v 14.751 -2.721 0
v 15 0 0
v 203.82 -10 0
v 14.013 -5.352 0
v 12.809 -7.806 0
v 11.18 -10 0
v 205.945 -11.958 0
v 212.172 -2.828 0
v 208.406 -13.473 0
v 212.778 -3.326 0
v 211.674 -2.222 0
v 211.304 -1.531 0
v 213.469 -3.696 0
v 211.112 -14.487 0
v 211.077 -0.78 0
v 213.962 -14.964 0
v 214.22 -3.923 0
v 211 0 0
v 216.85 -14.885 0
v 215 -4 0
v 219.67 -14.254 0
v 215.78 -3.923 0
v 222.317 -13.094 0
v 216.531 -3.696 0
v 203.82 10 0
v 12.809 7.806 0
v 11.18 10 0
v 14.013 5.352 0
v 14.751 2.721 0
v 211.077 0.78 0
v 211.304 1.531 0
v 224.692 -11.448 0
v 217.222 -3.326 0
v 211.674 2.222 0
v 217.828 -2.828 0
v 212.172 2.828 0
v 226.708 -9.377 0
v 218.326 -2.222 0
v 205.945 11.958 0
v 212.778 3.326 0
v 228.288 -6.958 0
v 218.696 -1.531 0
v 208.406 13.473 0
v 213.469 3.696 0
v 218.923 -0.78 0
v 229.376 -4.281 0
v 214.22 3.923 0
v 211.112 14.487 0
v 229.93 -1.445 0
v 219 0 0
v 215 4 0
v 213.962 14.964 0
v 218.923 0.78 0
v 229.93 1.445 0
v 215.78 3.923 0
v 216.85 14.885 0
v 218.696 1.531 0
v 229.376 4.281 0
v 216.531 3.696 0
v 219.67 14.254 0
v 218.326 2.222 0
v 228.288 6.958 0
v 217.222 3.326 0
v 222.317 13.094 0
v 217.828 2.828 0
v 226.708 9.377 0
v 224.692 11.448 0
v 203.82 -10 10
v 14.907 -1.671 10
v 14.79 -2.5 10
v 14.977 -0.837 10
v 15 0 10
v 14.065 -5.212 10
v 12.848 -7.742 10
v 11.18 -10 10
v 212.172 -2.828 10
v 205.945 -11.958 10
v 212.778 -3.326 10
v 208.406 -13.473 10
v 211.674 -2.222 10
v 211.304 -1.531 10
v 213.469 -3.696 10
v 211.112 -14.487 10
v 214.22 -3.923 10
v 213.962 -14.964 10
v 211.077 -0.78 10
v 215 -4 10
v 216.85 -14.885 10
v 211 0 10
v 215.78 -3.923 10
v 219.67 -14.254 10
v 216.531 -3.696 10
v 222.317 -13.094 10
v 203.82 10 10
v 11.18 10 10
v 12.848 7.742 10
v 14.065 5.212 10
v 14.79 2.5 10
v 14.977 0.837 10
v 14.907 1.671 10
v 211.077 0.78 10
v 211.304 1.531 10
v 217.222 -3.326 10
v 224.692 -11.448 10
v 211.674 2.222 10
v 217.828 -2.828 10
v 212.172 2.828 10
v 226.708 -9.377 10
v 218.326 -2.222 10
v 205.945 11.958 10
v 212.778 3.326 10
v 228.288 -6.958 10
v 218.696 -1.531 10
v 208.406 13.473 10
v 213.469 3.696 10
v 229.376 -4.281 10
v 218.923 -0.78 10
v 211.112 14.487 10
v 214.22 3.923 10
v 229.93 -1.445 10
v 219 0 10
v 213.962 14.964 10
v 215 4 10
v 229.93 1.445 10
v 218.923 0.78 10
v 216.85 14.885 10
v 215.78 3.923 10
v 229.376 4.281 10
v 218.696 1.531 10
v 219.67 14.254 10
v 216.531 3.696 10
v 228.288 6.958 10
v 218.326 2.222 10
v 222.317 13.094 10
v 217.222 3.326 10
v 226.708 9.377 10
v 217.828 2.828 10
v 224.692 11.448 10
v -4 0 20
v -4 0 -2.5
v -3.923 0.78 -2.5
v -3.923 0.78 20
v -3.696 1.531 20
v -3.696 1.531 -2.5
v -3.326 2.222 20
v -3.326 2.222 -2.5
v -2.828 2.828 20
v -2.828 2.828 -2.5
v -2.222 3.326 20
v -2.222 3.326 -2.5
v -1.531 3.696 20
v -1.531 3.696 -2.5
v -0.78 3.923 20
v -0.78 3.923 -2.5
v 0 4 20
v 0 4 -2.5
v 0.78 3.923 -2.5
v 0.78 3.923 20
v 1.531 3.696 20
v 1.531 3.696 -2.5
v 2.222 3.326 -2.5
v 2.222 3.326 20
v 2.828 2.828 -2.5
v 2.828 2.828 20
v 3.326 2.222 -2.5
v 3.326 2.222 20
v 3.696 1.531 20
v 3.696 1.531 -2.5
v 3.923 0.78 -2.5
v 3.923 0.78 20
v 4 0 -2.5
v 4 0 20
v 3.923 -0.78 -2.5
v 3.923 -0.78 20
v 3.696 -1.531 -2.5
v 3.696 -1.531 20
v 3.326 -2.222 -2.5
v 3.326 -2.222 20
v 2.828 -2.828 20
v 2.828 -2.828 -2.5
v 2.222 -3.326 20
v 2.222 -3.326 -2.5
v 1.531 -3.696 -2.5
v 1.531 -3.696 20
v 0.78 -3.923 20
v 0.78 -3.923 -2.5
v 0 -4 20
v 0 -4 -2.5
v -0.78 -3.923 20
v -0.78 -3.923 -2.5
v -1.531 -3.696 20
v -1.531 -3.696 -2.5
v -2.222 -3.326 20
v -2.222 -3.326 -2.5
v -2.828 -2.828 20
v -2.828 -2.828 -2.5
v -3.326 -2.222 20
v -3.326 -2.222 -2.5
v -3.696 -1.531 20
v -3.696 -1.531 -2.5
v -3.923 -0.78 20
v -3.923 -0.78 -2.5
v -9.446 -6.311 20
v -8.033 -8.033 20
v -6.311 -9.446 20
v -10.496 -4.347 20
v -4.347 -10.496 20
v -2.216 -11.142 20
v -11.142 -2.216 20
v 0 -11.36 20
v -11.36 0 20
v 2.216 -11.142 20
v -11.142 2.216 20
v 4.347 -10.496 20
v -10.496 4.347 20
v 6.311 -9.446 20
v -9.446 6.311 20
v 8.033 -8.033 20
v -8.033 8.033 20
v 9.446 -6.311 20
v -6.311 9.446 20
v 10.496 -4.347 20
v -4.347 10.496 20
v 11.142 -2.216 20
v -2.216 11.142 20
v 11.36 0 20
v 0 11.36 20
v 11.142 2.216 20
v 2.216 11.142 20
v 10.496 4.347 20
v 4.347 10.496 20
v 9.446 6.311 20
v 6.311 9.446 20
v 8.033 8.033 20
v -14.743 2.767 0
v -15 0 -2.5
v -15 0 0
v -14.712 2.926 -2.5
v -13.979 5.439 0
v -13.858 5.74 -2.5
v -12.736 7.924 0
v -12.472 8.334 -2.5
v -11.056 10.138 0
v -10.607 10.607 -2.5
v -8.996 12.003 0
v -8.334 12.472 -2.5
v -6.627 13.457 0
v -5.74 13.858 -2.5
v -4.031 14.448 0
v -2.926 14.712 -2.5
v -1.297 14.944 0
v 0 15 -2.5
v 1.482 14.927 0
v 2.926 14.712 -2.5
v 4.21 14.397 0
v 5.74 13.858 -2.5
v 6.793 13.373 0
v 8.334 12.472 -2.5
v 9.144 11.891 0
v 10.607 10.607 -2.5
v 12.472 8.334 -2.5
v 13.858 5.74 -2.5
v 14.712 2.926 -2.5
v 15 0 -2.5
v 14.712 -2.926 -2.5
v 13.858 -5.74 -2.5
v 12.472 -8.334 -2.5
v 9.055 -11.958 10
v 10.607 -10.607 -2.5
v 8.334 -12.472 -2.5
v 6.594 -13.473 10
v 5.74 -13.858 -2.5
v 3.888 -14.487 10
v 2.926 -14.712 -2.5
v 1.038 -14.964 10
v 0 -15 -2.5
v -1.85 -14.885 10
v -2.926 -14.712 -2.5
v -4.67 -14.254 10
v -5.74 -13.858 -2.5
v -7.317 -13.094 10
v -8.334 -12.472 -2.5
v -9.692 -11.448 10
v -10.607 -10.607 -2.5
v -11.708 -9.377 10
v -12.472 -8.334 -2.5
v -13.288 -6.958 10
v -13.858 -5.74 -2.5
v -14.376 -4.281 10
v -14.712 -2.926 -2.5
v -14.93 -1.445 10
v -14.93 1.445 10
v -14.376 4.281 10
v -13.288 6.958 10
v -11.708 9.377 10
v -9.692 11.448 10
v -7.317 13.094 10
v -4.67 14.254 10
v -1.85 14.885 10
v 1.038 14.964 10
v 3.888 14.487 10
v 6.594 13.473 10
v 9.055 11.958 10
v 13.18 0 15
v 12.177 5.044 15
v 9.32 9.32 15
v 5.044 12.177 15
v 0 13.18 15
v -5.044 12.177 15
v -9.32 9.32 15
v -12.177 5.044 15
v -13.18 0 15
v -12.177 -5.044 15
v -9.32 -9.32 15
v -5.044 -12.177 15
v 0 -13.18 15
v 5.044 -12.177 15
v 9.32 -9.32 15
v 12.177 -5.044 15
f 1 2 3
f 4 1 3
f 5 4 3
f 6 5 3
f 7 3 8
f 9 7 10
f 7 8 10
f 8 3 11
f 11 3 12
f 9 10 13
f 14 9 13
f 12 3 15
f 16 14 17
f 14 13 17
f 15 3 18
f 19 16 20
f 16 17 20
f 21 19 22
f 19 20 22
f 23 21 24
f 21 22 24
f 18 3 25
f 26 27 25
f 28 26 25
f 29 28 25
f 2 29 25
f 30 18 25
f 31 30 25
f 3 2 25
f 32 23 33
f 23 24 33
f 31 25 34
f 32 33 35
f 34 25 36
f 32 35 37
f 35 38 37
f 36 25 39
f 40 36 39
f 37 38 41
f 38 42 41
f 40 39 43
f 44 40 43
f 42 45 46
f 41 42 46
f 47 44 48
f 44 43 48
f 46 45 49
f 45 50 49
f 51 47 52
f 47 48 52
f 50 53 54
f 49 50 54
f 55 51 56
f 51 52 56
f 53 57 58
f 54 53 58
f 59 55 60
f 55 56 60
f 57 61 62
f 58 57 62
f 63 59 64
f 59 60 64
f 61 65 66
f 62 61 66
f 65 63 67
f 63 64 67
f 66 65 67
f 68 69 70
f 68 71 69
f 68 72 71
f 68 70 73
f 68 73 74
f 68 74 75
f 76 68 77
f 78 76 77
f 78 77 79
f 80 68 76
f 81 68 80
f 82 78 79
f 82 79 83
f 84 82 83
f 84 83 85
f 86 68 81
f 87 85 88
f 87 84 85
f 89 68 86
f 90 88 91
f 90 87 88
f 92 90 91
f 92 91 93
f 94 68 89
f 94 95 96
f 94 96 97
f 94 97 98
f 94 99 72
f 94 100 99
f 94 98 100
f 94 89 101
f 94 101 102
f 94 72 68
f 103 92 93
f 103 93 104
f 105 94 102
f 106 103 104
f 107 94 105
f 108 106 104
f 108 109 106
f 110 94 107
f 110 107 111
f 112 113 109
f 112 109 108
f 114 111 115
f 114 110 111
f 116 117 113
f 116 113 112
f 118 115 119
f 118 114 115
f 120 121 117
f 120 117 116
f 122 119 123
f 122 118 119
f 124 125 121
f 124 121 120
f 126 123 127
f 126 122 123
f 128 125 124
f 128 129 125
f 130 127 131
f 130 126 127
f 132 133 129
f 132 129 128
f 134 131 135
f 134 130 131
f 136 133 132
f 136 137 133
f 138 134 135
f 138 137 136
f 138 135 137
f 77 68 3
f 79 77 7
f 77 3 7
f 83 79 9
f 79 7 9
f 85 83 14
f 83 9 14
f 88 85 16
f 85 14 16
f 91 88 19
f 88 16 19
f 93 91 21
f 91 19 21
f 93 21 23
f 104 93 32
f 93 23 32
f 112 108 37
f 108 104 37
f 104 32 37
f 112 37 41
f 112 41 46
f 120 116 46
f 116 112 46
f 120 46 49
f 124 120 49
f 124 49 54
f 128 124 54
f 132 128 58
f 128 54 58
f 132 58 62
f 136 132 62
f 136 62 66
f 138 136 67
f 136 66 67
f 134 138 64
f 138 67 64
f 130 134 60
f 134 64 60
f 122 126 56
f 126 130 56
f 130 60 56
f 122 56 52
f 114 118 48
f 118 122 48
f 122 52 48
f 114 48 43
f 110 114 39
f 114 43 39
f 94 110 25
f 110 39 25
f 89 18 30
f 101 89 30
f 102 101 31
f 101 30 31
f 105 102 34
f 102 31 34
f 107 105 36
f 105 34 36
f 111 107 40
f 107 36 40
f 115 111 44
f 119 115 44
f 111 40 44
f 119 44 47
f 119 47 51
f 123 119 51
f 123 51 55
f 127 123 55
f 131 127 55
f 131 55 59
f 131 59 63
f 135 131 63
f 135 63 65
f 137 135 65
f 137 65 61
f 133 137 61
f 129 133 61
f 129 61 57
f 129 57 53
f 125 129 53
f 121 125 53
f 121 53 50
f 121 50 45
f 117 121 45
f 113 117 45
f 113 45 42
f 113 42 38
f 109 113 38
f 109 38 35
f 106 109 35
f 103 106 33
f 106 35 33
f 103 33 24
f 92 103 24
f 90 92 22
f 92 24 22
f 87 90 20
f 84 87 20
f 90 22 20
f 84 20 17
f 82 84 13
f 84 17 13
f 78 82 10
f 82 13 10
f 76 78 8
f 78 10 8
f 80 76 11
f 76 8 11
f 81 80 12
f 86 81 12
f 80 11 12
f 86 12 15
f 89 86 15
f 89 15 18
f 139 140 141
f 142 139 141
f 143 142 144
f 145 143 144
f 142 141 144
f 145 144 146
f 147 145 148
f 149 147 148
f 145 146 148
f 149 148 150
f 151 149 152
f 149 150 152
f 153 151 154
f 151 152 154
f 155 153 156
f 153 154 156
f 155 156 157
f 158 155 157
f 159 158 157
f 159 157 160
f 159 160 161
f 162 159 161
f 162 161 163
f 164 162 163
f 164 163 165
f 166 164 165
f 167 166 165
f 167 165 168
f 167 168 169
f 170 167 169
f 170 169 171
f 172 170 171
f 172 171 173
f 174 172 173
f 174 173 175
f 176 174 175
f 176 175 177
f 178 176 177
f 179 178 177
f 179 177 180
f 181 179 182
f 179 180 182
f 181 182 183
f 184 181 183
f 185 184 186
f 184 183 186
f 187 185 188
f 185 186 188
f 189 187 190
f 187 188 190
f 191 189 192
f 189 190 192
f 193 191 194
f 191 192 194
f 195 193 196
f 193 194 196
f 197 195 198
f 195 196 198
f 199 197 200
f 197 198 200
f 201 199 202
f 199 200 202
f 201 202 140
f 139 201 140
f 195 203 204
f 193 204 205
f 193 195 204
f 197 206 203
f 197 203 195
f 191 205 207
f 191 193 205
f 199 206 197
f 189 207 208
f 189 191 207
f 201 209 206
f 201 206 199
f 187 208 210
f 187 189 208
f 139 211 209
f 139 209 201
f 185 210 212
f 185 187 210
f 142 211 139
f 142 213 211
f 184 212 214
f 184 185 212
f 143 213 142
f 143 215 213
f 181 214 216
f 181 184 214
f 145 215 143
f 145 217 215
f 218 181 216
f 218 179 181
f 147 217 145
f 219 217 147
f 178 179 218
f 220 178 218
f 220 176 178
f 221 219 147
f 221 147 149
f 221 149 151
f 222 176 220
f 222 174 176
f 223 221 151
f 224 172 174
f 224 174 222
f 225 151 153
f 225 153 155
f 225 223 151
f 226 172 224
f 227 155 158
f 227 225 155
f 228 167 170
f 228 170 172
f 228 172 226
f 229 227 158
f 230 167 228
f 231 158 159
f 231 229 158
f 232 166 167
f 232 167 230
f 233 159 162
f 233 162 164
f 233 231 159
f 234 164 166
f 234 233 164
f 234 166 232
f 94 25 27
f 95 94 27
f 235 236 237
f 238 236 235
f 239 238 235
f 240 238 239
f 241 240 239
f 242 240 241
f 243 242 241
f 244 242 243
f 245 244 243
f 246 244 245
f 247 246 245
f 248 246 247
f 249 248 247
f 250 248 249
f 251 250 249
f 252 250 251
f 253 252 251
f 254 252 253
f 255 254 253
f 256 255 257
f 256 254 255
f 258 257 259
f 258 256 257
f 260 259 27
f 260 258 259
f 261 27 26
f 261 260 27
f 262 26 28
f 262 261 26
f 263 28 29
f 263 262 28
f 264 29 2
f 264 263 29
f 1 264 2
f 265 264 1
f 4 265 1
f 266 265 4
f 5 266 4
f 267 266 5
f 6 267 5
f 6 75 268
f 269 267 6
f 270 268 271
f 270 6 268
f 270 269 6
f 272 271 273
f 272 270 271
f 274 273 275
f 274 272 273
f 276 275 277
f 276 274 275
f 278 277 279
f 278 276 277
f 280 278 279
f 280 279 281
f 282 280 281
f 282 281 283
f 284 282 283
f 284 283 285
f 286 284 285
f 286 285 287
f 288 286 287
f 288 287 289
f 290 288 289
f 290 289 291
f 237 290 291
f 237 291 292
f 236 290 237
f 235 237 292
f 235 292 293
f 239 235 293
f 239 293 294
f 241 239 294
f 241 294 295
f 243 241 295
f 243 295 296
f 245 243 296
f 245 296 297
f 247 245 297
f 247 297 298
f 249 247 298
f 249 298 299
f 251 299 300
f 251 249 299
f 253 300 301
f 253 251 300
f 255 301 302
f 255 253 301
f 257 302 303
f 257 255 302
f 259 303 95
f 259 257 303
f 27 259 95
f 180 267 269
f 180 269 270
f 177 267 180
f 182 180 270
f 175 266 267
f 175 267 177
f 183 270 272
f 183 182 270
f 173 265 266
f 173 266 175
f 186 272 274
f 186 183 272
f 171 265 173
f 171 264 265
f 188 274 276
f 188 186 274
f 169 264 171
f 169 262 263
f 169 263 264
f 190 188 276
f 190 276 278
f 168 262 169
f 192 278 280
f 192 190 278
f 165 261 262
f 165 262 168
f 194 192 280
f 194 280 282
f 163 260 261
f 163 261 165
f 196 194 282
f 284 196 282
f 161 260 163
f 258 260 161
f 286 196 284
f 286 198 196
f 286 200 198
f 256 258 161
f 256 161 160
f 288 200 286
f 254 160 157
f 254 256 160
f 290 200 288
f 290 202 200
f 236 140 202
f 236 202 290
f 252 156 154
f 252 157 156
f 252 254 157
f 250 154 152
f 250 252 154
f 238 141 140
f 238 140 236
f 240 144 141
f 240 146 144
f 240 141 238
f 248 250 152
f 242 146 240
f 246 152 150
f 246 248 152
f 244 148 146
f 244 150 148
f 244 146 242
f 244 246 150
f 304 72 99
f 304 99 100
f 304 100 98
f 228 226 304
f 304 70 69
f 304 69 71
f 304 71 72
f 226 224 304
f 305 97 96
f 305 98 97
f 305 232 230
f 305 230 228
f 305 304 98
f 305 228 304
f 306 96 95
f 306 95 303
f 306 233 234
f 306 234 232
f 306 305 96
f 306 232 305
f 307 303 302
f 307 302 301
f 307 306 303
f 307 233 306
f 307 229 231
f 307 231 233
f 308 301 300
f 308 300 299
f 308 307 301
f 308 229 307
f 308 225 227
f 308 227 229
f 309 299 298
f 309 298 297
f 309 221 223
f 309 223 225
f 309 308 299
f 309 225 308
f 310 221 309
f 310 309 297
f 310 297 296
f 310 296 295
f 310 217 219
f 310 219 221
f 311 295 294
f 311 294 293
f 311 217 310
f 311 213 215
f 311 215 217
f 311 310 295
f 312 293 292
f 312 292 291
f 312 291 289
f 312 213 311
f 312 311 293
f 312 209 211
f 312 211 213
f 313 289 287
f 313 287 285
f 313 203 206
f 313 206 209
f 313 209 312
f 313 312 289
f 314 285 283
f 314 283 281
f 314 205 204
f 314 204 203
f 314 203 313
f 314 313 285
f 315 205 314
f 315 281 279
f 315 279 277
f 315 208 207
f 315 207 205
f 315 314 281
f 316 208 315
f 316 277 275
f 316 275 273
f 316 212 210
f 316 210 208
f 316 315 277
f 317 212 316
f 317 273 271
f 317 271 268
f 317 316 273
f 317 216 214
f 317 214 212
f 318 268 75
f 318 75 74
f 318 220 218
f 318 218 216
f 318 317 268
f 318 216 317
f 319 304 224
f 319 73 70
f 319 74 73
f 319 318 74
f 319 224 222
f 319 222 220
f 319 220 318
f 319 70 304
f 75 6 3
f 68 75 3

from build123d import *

# Parameters (mm, degrees)
SKETCH1_R             = 15
BOSS_EXTRUDE1_DEPTH   = 10
BOSS_EXTRUDE1_2_DEPTH = 10
SKETCH2_R             = 15
BOSS_EXTRUDE2_DEPTH   = 10
BOSS_EXTRUDE2_TAPER   = 20
BOSS_EXTRUDE3_DEPTH   = 5
BOSS_EXTRUDE4_DEPTH   = 5
SKETCH13_R            = 4
CUT_EXTRUDE1_DEPTH    = 20
BOSS_EXTRUDE7_START   = 2.5
SKETCH14_R            = 15
SKETCH14_R_2          = 4
BOSS_EXTRUDE7_DEPTH   = 2.5


with BuildPart() as part:
    # Sketch1 → Boss-Extrude1 (new body)
    with BuildSketch(Plane.XY):
        Circle(SKETCH1_R)
    extrude(amount=BOSS_EXTRUDE1_DEPTH)

    # Sketch2 → Boss-Extrude2 (add)
    with BuildSketch(Plane.XY.offset(10)):
        Circle(SKETCH2_R)
    extrude(amount=BOSS_EXTRUDE2_DEPTH, taper=BOSS_EXTRUDE2_TAPER)



with BuildPart() as body_2:
    # Sketch1 → Boss-Extrude1 2 (new body)
    with BuildSketch(Plane.XY):
        with Locations((215, 0)):
            Circle(SKETCH1_R)
    extrude(amount=BOSS_EXTRUDE1_2_DEPTH)


with BuildPart() as part_1:
    add(part.part)

    add(body_2.part)  # Boss-Extrude3 merges body 2
    # Sketch5 → Boss-Extrude3 (add)
    with BuildSketch(Plane.XY):
        with BuildLine():
            Line((203.819660113, 10), (11.180339887, 10))
            ThreePointArc((11.180339887, 10), (14.012585384, 5.352331347), (15, 0))
            ThreePointArc((15, 0), (14.012585384, -5.352331347), (11.180339887, -10))
            Line((11.180339887, -10), (203.819660113, -10))
            ThreePointArc((203.819660113, -10), (200, 0), (203.819660113, 10))
        make_face()
    extrude(amount=BOSS_EXTRUDE3_DEPTH)

    # Sketch6 → Boss-Extrude4 (add)
    with BuildSketch(Plane.XY.offset(5)):
        with BuildLine():
            ThreePointArc((15, 0), (14.947457842, -1.254393904), (14.790199458, -2.5))
            ThreePointArc((14.790199458, -2.5), (13.515906498, -6.505403256), (11.180339887, -10))
            Line((11.180339887, -10), (203.819660113, -10))
            ThreePointArc((203.819660113, -10), (200, 0), (203.819660113, 10))
            Line((203.819660113, 10), (11.180339887, 10))
            ThreePointArc((11.180339887, 10), (13.515906498, 6.505403256), (14.790199458, 2.5))
            ThreePointArc((14.790199458, 2.5), (14.947457842, 1.254393904), (15, 0))
        make_face()
    extrude(amount=BOSS_EXTRUDE4_DEPTH)

    # Sketch13 → Cut-Extrude1 (cut)
    with BuildSketch(Plane(origin=(0, 0, 0), x_dir=(-1, 0, 0), z_dir=(0, 0, -1))):
        with Locations((-215, 0)):
            Circle(SKETCH13_R)
        Circle(SKETCH13_R)
    extrude(amount=-CUT_EXTRUDE1_DEPTH, mode=Mode.SUBTRACT)

    # Sketch14 → Boss-Extrude7 (add)
    with BuildSketch(Plane(origin=(0, 0, 0), x_dir=(-1, 0, 0), z_dir=(0, 0, -1)).offset(BOSS_EXTRUDE7_START)):
        Circle(SKETCH14_R)
        Circle(SKETCH14_R_2, mode=Mode.SUBTRACT)
    extrude(amount=-BOSS_EXTRUDE7_DEPTH)


solid = part_1.part
